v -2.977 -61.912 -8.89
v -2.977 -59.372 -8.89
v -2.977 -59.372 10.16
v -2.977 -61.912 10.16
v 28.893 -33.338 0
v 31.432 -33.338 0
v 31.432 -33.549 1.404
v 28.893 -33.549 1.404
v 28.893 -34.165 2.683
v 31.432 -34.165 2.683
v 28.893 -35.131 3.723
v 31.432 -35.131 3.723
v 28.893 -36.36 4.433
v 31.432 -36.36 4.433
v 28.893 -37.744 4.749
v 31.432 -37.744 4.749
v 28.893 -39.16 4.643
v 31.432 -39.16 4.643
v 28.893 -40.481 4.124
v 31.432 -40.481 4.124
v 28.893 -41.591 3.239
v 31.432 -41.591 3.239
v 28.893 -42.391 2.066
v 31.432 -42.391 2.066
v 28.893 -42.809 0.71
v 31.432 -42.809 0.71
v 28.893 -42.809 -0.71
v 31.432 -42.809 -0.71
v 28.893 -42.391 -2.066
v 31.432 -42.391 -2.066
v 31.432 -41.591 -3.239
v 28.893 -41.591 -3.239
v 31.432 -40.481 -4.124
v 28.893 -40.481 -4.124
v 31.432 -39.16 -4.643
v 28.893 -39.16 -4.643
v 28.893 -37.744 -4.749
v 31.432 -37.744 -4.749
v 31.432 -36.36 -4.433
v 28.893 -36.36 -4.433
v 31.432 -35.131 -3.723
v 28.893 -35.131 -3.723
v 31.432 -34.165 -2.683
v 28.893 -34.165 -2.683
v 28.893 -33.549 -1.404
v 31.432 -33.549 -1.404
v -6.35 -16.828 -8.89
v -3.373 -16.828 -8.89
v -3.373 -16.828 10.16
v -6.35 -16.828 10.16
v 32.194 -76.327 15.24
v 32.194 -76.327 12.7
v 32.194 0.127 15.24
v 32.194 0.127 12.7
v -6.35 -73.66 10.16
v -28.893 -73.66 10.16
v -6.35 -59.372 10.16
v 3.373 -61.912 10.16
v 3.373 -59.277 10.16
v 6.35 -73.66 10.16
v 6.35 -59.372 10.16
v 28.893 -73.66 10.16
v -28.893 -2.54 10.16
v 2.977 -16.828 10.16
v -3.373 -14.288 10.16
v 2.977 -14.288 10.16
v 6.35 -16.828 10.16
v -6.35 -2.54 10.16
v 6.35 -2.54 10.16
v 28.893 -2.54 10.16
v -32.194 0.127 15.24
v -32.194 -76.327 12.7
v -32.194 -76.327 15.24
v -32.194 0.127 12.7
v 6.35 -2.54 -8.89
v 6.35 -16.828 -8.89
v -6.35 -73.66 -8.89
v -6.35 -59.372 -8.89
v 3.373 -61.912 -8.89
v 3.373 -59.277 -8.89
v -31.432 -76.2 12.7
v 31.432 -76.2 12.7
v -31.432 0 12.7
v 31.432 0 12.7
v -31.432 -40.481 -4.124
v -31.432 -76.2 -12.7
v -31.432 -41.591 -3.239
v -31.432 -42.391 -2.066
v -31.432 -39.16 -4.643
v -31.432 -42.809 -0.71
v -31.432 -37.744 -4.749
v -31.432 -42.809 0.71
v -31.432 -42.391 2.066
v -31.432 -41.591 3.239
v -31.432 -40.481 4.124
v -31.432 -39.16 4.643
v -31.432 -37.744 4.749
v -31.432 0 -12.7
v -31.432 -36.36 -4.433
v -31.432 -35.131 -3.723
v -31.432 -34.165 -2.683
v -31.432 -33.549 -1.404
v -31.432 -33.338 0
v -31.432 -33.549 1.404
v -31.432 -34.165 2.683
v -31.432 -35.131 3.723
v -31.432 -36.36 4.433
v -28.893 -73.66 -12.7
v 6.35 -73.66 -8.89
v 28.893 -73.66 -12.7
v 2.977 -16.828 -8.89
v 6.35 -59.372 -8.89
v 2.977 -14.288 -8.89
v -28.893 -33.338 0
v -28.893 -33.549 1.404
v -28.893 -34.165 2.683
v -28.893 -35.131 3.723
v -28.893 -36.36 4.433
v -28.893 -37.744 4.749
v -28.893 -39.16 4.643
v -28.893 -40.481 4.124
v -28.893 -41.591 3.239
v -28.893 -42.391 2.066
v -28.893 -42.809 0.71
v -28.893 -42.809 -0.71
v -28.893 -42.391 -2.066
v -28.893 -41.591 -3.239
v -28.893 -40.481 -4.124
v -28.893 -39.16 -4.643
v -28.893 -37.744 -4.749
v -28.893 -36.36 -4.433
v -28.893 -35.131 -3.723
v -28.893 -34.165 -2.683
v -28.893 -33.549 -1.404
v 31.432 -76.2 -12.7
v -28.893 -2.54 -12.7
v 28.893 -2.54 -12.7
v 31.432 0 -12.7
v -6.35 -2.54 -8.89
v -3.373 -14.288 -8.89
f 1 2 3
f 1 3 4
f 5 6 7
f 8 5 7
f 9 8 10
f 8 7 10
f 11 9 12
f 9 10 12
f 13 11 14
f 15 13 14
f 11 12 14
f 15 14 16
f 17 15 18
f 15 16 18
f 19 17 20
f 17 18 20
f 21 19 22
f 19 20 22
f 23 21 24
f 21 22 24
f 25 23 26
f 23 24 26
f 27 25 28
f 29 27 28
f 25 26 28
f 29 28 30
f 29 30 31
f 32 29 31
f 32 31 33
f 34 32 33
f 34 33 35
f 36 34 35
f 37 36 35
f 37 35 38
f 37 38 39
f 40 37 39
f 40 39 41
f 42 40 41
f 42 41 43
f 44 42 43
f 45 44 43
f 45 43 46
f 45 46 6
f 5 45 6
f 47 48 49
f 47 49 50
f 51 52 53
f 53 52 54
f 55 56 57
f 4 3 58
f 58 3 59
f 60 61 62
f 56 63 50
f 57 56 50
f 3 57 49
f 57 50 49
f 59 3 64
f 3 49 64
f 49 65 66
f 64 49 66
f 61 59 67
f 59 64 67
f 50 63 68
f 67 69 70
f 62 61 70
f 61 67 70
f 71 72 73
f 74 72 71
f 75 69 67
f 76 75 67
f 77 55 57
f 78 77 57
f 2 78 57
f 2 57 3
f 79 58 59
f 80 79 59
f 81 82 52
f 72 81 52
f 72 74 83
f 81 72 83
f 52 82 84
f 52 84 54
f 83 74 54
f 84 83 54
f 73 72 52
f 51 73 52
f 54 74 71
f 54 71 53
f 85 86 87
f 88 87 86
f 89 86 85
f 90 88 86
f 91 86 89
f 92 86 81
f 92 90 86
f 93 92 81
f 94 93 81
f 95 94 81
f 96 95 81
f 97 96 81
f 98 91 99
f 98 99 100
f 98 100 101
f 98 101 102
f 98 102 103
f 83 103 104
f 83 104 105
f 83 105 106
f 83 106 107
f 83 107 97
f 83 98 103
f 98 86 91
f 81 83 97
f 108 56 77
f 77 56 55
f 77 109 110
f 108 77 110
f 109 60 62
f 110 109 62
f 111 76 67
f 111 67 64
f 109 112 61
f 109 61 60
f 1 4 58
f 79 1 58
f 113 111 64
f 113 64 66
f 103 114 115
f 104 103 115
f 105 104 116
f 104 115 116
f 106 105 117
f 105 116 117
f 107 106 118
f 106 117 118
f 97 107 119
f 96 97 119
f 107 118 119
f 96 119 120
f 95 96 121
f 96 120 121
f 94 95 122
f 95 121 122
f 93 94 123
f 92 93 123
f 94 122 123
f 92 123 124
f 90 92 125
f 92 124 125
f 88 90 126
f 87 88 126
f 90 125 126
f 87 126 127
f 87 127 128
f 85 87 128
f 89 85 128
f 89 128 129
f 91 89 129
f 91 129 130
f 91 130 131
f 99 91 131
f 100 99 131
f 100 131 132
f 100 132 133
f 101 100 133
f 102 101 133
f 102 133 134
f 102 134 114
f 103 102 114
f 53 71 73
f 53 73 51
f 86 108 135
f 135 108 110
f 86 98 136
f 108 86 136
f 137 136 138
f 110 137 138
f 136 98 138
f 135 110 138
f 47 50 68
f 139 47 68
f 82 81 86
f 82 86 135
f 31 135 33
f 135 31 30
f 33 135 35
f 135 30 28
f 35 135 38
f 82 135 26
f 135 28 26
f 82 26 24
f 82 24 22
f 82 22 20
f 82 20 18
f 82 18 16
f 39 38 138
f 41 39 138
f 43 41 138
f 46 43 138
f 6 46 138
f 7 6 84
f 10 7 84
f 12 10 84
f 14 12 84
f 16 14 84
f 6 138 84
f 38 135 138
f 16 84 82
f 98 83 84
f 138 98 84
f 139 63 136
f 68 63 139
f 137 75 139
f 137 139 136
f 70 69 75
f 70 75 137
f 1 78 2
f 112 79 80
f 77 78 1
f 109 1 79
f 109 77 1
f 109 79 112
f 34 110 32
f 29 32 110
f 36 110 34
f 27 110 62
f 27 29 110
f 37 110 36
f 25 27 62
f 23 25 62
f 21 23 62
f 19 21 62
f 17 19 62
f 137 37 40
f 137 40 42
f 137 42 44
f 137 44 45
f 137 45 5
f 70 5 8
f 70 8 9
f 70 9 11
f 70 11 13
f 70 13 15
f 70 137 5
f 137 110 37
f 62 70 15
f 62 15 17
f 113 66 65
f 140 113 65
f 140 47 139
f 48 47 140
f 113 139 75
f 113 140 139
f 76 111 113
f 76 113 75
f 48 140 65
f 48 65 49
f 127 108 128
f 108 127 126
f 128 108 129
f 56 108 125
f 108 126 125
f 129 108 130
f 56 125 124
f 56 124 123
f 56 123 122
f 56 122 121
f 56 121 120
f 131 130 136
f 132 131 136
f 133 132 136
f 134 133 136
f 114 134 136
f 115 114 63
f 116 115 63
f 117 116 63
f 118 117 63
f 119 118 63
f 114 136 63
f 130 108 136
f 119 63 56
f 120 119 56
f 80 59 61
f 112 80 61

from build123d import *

# Parameters (mm, degrees)
F0_W     = 62.865
F0_H     = 25.4
F1_DEPTH = 76.2
F3_T     = -2.54
F4_W     = 64.389
F4_H     = 76.454
F5_DEPTH = 2.54
F2_R     = 4.7625
F6_DEPTH = 63.628
F8_DEPTH = 19.05


with BuildPart() as f1:
    # F0 (on Front) → F1 (new body)
    with BuildSketch(Plane.XZ):
        Rectangle(F0_W, F0_H)
    extrude(amount=F1_DEPTH)

    # F3
    f3_openings = [f1.faces().sort_by_distance(p)[0] for p in [
        (0, -38.1, -12.7),
    ]]
    offset(amount=F3_T, openings=f3_openings)

    # F4 (on face) → F5 (join)
    with BuildSketch(Plane.XY.offset(12.7)):
        with Locations((0, -38.1)):
            Rectangle(F4_W, F4_H)
    extrude(amount=F5_DEPTH)

    # F2 (on face) → F6 (cut, through all)
    with BuildSketch(Plane.YZ.offset(31.4325)):
        with Locations((-38.1, 0)):
            Circle(F2_R)
    extrude(amount=-F6_DEPTH, mode=Mode.SUBTRACT)

    # F7 (on face) → F8 (join)
    with BuildSketch(Plane(origin=(0, 0, 10.16), x_dir=(1, 0, 0), z_dir=(0, 0, -1))):
        Polygon((-2.976563, 61.9125), (3.373437, 61.9125), (3.373437, 59.27708), (6.35, 59.3725), (6.35, 61.9125), (6.35, 73.66), (0, 73.66), (-6.35, 73.66), (-6.35, 61.9125), (-6.35, 59.3725), (-2.976563, 59.3725), align=None)
        Polygon((2.976563, 16.8275), (2.976563, 14.2875), (-3.373437, 14.2875), (-3.373437, 16.8275), (-6.35, 16.8275), (-6.35, 14.2875), (-6.35, 2.54), (6.35, 2.54), (6.35, 14.2875), (6.35, 16.8275), align=None)
    extrude(amount=F8_DEPTH)


solid = f1.part
